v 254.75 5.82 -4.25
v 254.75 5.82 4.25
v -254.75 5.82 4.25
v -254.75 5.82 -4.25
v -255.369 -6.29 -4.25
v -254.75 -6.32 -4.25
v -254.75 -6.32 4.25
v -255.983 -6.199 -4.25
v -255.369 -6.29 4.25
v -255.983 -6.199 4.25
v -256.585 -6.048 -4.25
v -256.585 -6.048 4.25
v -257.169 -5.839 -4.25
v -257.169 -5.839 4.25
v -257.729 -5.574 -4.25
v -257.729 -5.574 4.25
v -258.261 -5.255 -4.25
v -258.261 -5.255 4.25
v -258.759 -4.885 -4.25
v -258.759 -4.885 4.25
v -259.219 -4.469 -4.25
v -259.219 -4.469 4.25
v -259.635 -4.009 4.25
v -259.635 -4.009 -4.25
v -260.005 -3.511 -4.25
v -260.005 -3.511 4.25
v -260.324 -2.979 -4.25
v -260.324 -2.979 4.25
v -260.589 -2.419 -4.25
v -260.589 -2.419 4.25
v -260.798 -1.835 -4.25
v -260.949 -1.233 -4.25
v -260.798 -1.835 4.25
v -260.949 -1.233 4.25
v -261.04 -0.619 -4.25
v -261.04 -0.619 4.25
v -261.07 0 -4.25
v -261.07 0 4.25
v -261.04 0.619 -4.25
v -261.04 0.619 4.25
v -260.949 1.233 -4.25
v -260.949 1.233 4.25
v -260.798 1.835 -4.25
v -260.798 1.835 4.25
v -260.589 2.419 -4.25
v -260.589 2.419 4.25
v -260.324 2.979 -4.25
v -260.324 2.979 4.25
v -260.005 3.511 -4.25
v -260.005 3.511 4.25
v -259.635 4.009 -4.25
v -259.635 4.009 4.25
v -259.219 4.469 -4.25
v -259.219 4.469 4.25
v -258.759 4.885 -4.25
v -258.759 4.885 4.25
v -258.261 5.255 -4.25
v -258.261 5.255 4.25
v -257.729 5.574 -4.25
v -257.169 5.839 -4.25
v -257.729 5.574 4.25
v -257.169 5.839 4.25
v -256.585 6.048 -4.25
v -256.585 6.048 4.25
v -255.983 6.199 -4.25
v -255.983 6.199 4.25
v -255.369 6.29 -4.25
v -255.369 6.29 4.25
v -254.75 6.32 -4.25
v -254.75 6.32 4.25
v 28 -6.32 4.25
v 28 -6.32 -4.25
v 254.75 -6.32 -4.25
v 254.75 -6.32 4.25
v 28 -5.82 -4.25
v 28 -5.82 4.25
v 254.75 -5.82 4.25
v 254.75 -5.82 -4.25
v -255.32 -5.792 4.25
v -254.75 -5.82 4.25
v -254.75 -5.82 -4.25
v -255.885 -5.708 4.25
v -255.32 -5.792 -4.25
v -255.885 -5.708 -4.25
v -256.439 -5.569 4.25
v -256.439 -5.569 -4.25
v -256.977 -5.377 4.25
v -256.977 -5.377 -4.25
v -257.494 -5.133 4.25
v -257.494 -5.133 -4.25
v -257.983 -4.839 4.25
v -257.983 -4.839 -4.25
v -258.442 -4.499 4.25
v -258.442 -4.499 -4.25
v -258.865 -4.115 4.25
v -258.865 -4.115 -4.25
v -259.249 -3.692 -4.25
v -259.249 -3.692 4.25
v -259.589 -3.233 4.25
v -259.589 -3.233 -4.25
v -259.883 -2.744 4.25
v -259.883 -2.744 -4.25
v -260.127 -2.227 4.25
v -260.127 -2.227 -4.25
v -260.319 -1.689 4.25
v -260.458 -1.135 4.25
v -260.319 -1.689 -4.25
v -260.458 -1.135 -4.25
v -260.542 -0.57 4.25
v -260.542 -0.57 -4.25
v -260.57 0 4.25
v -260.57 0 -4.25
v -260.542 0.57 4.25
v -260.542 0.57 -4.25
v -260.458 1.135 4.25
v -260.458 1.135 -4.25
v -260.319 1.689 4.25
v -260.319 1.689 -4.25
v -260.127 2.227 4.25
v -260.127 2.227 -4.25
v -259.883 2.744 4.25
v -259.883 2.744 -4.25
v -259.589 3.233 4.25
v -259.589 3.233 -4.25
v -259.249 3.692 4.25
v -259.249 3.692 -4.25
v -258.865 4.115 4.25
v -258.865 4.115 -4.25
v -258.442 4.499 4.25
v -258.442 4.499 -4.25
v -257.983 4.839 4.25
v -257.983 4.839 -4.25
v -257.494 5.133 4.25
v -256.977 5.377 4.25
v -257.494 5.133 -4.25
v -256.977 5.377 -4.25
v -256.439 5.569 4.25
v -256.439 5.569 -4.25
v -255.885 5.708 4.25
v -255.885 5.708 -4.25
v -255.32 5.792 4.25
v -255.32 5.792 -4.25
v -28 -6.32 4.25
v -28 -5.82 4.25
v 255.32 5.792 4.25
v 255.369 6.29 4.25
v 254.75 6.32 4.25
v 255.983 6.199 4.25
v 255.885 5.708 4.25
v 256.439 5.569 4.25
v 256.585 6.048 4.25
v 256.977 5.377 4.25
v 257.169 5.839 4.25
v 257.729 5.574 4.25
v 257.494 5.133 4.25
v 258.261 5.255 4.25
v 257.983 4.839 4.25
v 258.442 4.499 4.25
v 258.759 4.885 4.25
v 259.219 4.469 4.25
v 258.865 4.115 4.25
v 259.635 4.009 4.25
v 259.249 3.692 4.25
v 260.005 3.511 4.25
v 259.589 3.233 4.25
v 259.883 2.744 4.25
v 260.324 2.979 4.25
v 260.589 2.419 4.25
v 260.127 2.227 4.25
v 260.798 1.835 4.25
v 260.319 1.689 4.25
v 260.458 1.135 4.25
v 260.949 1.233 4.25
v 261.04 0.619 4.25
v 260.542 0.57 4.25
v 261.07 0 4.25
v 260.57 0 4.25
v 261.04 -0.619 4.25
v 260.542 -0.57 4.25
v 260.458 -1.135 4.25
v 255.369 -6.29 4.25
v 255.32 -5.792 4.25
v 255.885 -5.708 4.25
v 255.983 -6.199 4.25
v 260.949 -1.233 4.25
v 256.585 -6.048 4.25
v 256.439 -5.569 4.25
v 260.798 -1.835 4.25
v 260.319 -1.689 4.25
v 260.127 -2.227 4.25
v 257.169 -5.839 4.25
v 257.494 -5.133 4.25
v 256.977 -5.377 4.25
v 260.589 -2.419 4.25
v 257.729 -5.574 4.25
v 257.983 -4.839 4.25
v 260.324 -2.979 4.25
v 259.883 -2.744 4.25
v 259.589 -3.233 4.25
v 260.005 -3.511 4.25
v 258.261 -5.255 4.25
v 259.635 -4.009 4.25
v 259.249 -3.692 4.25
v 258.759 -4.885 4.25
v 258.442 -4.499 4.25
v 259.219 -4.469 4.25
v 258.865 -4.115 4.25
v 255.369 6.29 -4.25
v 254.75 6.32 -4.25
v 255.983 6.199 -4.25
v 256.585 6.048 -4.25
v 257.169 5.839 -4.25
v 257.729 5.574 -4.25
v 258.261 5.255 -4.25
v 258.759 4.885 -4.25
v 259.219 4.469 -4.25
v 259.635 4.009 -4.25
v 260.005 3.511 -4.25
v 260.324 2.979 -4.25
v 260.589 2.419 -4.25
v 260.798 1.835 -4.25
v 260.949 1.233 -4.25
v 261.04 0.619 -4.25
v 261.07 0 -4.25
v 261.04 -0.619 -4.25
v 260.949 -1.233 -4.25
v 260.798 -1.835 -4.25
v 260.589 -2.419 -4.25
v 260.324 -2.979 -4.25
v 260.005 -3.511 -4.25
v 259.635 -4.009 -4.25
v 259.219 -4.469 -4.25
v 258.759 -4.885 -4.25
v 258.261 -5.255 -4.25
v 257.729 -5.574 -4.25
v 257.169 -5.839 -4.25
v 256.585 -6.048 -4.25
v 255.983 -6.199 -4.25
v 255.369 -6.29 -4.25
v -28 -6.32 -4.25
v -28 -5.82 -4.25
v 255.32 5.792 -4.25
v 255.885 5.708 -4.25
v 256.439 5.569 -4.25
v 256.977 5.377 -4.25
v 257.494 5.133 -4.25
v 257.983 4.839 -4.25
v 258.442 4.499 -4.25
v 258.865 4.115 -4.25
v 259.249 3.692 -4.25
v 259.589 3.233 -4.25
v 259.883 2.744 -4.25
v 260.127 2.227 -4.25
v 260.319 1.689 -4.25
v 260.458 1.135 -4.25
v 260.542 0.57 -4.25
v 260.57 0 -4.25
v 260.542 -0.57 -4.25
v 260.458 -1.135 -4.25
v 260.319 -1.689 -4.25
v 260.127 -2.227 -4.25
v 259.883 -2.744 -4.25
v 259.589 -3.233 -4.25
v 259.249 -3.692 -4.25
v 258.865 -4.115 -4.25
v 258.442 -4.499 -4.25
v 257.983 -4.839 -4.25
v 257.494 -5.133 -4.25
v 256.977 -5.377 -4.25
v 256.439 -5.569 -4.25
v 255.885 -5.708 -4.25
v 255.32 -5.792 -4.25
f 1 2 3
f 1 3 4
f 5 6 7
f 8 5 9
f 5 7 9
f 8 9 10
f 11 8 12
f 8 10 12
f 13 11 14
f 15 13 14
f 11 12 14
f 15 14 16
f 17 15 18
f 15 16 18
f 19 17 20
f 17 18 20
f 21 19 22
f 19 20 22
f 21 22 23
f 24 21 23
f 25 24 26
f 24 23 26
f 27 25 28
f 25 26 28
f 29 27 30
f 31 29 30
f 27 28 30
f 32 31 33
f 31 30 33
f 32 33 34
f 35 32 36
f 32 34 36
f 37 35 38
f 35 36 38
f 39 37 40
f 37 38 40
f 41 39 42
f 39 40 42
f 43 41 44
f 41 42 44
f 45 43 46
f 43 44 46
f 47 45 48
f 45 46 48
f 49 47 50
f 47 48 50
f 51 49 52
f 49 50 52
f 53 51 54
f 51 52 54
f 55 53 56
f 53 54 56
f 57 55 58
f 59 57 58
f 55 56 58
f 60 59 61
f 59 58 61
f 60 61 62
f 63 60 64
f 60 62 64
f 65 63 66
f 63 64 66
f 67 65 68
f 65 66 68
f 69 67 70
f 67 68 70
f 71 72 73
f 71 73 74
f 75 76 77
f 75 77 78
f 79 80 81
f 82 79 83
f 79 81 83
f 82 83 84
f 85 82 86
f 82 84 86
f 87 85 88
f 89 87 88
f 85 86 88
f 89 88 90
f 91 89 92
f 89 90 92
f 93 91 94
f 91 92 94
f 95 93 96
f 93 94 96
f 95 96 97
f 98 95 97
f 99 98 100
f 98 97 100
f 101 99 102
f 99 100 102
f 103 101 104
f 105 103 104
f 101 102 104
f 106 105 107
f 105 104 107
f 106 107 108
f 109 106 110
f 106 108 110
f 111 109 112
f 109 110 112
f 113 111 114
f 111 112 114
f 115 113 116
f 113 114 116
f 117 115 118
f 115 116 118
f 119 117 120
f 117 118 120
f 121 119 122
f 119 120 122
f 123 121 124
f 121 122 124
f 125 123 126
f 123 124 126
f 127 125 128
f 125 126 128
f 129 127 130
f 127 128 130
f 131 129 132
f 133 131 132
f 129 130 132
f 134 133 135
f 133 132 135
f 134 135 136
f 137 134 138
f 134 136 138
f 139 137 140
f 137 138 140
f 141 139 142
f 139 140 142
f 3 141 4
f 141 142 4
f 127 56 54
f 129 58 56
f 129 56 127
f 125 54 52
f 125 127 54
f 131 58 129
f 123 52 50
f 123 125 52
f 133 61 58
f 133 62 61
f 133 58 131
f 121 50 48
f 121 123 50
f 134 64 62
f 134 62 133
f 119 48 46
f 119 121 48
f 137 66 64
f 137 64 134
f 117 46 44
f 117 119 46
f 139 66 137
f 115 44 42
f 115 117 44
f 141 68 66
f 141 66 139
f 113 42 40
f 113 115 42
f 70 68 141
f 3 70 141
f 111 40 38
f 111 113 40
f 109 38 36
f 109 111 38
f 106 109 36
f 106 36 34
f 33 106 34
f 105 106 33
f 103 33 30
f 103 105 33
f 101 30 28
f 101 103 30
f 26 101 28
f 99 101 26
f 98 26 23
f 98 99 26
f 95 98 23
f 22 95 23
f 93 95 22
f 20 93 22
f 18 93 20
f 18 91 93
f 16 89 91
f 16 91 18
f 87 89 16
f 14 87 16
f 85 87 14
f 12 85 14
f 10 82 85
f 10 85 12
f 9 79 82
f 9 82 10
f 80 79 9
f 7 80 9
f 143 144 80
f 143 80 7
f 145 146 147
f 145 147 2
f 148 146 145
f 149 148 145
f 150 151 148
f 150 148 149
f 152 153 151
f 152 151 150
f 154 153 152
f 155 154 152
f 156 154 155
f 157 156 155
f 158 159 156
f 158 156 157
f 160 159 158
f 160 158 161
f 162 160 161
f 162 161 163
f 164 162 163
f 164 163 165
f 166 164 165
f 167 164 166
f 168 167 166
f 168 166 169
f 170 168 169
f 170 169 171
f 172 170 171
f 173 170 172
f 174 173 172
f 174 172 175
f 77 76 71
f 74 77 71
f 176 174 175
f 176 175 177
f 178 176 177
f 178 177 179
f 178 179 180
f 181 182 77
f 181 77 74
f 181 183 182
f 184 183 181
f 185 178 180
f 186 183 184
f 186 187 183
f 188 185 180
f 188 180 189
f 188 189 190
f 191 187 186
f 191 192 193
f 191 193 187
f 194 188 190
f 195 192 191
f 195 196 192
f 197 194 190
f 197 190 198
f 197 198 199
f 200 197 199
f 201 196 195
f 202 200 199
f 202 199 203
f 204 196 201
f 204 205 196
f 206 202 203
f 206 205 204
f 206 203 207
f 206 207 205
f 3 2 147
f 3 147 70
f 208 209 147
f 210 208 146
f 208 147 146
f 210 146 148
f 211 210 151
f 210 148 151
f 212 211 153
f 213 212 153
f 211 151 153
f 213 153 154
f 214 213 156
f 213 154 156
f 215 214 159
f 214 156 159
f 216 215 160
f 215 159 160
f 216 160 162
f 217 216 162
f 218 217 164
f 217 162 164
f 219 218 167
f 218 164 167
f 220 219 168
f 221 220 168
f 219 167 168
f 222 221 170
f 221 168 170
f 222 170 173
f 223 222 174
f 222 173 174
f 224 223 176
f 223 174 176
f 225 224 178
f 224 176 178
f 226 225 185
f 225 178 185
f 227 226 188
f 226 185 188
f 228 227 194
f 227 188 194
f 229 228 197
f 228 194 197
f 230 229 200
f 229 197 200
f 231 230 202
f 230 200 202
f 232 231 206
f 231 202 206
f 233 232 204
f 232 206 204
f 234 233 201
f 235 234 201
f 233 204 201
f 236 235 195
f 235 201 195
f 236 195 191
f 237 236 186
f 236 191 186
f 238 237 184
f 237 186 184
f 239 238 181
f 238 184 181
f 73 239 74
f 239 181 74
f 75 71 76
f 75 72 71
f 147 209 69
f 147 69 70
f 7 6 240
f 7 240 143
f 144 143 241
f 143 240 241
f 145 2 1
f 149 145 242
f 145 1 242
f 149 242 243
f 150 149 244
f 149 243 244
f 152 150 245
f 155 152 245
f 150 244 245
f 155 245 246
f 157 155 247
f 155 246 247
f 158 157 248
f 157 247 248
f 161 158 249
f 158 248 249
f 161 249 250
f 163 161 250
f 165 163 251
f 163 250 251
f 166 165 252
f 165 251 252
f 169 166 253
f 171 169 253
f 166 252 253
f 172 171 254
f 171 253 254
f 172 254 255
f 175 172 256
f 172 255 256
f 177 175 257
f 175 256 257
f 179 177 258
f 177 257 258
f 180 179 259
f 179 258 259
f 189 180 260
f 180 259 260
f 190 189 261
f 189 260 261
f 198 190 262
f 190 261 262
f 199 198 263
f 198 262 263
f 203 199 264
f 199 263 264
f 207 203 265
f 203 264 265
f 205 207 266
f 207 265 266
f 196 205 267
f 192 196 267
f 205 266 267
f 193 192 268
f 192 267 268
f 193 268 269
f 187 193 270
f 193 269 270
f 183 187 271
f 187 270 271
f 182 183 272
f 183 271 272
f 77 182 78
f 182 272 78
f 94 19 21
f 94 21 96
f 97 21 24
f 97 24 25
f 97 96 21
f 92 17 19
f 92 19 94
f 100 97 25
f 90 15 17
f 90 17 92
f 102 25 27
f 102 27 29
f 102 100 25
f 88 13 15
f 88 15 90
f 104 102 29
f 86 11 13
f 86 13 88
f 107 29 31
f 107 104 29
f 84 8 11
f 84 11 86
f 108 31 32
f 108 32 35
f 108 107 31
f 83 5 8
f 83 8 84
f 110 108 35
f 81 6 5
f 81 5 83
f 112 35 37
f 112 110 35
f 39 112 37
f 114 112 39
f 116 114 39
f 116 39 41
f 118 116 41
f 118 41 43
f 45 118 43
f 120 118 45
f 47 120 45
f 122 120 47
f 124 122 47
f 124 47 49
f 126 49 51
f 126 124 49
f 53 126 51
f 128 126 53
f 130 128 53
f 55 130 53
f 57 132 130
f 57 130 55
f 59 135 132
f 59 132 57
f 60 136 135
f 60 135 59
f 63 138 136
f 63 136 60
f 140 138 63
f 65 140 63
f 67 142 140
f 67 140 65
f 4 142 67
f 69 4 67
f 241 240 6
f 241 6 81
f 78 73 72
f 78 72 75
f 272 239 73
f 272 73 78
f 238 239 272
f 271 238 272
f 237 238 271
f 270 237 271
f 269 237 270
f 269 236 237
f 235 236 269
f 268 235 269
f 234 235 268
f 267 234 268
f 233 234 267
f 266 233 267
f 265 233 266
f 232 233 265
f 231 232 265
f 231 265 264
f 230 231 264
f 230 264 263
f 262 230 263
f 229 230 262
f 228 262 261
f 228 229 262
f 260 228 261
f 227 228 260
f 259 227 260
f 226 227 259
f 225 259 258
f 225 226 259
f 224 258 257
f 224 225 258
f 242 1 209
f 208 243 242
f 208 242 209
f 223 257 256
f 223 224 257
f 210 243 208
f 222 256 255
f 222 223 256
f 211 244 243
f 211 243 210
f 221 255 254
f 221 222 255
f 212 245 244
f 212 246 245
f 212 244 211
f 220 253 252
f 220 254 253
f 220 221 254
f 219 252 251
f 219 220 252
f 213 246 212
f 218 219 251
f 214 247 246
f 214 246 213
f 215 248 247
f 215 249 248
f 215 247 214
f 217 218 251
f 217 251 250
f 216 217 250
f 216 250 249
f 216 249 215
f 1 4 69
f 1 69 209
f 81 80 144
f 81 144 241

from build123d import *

# Parameters (mm, degrees)
SKETCH2_W               = 8.5
SKETCH2_H               = 0.5
CUT_EXTRUDE1_DEPTH      = 262.181067078
CUT_EXTRUDE1_DEPTH_BACK = 262.181067078
SKETCH3_W               = 56
SKETCH3_H               = 40


with BuildPart() as part:
    # Sweep1: sweep along a path in Sketch1
    with BuildLine(Plane.XY) as sweep1_path:
        Line((-254.75, 5.82), (254.75, 5.82))
        ThreePointArc((254.75, 5.82), (260.57, 0), (254.75, -5.82))
        Line((254.75, -5.82), (-254.75, -5.82))
        ThreePointArc((-254.75, -5.82), (-260.57, 0), (-254.75, 5.82))
    # Sketch2 → Sweep1 (sweep)
    with BuildSketch(Plane(origin=(0, 0, 0), x_dir=(0, 0, -1), z_dir=(1, 0, 0))):
        with Locations((0, 6.07)):
            Rectangle(SKETCH2_W, SKETCH2_H)
    sweep(path=sweep1_path.line)

    # Sketch3 → Cut-Extrude1 (cut, two sides: drawn at the far end of the back side and taken through both)
    with BuildSketch(Plane.XY.offset(-CUT_EXTRUDE1_DEPTH_BACK)):
        with Locations((0, -20)):
            Rectangle(SKETCH3_W, SKETCH3_H)
    extrude(amount=CUT_EXTRUDE1_DEPTH + CUT_EXTRUDE1_DEPTH_BACK, mode=Mode.SUBTRACT)


solid = part.part
